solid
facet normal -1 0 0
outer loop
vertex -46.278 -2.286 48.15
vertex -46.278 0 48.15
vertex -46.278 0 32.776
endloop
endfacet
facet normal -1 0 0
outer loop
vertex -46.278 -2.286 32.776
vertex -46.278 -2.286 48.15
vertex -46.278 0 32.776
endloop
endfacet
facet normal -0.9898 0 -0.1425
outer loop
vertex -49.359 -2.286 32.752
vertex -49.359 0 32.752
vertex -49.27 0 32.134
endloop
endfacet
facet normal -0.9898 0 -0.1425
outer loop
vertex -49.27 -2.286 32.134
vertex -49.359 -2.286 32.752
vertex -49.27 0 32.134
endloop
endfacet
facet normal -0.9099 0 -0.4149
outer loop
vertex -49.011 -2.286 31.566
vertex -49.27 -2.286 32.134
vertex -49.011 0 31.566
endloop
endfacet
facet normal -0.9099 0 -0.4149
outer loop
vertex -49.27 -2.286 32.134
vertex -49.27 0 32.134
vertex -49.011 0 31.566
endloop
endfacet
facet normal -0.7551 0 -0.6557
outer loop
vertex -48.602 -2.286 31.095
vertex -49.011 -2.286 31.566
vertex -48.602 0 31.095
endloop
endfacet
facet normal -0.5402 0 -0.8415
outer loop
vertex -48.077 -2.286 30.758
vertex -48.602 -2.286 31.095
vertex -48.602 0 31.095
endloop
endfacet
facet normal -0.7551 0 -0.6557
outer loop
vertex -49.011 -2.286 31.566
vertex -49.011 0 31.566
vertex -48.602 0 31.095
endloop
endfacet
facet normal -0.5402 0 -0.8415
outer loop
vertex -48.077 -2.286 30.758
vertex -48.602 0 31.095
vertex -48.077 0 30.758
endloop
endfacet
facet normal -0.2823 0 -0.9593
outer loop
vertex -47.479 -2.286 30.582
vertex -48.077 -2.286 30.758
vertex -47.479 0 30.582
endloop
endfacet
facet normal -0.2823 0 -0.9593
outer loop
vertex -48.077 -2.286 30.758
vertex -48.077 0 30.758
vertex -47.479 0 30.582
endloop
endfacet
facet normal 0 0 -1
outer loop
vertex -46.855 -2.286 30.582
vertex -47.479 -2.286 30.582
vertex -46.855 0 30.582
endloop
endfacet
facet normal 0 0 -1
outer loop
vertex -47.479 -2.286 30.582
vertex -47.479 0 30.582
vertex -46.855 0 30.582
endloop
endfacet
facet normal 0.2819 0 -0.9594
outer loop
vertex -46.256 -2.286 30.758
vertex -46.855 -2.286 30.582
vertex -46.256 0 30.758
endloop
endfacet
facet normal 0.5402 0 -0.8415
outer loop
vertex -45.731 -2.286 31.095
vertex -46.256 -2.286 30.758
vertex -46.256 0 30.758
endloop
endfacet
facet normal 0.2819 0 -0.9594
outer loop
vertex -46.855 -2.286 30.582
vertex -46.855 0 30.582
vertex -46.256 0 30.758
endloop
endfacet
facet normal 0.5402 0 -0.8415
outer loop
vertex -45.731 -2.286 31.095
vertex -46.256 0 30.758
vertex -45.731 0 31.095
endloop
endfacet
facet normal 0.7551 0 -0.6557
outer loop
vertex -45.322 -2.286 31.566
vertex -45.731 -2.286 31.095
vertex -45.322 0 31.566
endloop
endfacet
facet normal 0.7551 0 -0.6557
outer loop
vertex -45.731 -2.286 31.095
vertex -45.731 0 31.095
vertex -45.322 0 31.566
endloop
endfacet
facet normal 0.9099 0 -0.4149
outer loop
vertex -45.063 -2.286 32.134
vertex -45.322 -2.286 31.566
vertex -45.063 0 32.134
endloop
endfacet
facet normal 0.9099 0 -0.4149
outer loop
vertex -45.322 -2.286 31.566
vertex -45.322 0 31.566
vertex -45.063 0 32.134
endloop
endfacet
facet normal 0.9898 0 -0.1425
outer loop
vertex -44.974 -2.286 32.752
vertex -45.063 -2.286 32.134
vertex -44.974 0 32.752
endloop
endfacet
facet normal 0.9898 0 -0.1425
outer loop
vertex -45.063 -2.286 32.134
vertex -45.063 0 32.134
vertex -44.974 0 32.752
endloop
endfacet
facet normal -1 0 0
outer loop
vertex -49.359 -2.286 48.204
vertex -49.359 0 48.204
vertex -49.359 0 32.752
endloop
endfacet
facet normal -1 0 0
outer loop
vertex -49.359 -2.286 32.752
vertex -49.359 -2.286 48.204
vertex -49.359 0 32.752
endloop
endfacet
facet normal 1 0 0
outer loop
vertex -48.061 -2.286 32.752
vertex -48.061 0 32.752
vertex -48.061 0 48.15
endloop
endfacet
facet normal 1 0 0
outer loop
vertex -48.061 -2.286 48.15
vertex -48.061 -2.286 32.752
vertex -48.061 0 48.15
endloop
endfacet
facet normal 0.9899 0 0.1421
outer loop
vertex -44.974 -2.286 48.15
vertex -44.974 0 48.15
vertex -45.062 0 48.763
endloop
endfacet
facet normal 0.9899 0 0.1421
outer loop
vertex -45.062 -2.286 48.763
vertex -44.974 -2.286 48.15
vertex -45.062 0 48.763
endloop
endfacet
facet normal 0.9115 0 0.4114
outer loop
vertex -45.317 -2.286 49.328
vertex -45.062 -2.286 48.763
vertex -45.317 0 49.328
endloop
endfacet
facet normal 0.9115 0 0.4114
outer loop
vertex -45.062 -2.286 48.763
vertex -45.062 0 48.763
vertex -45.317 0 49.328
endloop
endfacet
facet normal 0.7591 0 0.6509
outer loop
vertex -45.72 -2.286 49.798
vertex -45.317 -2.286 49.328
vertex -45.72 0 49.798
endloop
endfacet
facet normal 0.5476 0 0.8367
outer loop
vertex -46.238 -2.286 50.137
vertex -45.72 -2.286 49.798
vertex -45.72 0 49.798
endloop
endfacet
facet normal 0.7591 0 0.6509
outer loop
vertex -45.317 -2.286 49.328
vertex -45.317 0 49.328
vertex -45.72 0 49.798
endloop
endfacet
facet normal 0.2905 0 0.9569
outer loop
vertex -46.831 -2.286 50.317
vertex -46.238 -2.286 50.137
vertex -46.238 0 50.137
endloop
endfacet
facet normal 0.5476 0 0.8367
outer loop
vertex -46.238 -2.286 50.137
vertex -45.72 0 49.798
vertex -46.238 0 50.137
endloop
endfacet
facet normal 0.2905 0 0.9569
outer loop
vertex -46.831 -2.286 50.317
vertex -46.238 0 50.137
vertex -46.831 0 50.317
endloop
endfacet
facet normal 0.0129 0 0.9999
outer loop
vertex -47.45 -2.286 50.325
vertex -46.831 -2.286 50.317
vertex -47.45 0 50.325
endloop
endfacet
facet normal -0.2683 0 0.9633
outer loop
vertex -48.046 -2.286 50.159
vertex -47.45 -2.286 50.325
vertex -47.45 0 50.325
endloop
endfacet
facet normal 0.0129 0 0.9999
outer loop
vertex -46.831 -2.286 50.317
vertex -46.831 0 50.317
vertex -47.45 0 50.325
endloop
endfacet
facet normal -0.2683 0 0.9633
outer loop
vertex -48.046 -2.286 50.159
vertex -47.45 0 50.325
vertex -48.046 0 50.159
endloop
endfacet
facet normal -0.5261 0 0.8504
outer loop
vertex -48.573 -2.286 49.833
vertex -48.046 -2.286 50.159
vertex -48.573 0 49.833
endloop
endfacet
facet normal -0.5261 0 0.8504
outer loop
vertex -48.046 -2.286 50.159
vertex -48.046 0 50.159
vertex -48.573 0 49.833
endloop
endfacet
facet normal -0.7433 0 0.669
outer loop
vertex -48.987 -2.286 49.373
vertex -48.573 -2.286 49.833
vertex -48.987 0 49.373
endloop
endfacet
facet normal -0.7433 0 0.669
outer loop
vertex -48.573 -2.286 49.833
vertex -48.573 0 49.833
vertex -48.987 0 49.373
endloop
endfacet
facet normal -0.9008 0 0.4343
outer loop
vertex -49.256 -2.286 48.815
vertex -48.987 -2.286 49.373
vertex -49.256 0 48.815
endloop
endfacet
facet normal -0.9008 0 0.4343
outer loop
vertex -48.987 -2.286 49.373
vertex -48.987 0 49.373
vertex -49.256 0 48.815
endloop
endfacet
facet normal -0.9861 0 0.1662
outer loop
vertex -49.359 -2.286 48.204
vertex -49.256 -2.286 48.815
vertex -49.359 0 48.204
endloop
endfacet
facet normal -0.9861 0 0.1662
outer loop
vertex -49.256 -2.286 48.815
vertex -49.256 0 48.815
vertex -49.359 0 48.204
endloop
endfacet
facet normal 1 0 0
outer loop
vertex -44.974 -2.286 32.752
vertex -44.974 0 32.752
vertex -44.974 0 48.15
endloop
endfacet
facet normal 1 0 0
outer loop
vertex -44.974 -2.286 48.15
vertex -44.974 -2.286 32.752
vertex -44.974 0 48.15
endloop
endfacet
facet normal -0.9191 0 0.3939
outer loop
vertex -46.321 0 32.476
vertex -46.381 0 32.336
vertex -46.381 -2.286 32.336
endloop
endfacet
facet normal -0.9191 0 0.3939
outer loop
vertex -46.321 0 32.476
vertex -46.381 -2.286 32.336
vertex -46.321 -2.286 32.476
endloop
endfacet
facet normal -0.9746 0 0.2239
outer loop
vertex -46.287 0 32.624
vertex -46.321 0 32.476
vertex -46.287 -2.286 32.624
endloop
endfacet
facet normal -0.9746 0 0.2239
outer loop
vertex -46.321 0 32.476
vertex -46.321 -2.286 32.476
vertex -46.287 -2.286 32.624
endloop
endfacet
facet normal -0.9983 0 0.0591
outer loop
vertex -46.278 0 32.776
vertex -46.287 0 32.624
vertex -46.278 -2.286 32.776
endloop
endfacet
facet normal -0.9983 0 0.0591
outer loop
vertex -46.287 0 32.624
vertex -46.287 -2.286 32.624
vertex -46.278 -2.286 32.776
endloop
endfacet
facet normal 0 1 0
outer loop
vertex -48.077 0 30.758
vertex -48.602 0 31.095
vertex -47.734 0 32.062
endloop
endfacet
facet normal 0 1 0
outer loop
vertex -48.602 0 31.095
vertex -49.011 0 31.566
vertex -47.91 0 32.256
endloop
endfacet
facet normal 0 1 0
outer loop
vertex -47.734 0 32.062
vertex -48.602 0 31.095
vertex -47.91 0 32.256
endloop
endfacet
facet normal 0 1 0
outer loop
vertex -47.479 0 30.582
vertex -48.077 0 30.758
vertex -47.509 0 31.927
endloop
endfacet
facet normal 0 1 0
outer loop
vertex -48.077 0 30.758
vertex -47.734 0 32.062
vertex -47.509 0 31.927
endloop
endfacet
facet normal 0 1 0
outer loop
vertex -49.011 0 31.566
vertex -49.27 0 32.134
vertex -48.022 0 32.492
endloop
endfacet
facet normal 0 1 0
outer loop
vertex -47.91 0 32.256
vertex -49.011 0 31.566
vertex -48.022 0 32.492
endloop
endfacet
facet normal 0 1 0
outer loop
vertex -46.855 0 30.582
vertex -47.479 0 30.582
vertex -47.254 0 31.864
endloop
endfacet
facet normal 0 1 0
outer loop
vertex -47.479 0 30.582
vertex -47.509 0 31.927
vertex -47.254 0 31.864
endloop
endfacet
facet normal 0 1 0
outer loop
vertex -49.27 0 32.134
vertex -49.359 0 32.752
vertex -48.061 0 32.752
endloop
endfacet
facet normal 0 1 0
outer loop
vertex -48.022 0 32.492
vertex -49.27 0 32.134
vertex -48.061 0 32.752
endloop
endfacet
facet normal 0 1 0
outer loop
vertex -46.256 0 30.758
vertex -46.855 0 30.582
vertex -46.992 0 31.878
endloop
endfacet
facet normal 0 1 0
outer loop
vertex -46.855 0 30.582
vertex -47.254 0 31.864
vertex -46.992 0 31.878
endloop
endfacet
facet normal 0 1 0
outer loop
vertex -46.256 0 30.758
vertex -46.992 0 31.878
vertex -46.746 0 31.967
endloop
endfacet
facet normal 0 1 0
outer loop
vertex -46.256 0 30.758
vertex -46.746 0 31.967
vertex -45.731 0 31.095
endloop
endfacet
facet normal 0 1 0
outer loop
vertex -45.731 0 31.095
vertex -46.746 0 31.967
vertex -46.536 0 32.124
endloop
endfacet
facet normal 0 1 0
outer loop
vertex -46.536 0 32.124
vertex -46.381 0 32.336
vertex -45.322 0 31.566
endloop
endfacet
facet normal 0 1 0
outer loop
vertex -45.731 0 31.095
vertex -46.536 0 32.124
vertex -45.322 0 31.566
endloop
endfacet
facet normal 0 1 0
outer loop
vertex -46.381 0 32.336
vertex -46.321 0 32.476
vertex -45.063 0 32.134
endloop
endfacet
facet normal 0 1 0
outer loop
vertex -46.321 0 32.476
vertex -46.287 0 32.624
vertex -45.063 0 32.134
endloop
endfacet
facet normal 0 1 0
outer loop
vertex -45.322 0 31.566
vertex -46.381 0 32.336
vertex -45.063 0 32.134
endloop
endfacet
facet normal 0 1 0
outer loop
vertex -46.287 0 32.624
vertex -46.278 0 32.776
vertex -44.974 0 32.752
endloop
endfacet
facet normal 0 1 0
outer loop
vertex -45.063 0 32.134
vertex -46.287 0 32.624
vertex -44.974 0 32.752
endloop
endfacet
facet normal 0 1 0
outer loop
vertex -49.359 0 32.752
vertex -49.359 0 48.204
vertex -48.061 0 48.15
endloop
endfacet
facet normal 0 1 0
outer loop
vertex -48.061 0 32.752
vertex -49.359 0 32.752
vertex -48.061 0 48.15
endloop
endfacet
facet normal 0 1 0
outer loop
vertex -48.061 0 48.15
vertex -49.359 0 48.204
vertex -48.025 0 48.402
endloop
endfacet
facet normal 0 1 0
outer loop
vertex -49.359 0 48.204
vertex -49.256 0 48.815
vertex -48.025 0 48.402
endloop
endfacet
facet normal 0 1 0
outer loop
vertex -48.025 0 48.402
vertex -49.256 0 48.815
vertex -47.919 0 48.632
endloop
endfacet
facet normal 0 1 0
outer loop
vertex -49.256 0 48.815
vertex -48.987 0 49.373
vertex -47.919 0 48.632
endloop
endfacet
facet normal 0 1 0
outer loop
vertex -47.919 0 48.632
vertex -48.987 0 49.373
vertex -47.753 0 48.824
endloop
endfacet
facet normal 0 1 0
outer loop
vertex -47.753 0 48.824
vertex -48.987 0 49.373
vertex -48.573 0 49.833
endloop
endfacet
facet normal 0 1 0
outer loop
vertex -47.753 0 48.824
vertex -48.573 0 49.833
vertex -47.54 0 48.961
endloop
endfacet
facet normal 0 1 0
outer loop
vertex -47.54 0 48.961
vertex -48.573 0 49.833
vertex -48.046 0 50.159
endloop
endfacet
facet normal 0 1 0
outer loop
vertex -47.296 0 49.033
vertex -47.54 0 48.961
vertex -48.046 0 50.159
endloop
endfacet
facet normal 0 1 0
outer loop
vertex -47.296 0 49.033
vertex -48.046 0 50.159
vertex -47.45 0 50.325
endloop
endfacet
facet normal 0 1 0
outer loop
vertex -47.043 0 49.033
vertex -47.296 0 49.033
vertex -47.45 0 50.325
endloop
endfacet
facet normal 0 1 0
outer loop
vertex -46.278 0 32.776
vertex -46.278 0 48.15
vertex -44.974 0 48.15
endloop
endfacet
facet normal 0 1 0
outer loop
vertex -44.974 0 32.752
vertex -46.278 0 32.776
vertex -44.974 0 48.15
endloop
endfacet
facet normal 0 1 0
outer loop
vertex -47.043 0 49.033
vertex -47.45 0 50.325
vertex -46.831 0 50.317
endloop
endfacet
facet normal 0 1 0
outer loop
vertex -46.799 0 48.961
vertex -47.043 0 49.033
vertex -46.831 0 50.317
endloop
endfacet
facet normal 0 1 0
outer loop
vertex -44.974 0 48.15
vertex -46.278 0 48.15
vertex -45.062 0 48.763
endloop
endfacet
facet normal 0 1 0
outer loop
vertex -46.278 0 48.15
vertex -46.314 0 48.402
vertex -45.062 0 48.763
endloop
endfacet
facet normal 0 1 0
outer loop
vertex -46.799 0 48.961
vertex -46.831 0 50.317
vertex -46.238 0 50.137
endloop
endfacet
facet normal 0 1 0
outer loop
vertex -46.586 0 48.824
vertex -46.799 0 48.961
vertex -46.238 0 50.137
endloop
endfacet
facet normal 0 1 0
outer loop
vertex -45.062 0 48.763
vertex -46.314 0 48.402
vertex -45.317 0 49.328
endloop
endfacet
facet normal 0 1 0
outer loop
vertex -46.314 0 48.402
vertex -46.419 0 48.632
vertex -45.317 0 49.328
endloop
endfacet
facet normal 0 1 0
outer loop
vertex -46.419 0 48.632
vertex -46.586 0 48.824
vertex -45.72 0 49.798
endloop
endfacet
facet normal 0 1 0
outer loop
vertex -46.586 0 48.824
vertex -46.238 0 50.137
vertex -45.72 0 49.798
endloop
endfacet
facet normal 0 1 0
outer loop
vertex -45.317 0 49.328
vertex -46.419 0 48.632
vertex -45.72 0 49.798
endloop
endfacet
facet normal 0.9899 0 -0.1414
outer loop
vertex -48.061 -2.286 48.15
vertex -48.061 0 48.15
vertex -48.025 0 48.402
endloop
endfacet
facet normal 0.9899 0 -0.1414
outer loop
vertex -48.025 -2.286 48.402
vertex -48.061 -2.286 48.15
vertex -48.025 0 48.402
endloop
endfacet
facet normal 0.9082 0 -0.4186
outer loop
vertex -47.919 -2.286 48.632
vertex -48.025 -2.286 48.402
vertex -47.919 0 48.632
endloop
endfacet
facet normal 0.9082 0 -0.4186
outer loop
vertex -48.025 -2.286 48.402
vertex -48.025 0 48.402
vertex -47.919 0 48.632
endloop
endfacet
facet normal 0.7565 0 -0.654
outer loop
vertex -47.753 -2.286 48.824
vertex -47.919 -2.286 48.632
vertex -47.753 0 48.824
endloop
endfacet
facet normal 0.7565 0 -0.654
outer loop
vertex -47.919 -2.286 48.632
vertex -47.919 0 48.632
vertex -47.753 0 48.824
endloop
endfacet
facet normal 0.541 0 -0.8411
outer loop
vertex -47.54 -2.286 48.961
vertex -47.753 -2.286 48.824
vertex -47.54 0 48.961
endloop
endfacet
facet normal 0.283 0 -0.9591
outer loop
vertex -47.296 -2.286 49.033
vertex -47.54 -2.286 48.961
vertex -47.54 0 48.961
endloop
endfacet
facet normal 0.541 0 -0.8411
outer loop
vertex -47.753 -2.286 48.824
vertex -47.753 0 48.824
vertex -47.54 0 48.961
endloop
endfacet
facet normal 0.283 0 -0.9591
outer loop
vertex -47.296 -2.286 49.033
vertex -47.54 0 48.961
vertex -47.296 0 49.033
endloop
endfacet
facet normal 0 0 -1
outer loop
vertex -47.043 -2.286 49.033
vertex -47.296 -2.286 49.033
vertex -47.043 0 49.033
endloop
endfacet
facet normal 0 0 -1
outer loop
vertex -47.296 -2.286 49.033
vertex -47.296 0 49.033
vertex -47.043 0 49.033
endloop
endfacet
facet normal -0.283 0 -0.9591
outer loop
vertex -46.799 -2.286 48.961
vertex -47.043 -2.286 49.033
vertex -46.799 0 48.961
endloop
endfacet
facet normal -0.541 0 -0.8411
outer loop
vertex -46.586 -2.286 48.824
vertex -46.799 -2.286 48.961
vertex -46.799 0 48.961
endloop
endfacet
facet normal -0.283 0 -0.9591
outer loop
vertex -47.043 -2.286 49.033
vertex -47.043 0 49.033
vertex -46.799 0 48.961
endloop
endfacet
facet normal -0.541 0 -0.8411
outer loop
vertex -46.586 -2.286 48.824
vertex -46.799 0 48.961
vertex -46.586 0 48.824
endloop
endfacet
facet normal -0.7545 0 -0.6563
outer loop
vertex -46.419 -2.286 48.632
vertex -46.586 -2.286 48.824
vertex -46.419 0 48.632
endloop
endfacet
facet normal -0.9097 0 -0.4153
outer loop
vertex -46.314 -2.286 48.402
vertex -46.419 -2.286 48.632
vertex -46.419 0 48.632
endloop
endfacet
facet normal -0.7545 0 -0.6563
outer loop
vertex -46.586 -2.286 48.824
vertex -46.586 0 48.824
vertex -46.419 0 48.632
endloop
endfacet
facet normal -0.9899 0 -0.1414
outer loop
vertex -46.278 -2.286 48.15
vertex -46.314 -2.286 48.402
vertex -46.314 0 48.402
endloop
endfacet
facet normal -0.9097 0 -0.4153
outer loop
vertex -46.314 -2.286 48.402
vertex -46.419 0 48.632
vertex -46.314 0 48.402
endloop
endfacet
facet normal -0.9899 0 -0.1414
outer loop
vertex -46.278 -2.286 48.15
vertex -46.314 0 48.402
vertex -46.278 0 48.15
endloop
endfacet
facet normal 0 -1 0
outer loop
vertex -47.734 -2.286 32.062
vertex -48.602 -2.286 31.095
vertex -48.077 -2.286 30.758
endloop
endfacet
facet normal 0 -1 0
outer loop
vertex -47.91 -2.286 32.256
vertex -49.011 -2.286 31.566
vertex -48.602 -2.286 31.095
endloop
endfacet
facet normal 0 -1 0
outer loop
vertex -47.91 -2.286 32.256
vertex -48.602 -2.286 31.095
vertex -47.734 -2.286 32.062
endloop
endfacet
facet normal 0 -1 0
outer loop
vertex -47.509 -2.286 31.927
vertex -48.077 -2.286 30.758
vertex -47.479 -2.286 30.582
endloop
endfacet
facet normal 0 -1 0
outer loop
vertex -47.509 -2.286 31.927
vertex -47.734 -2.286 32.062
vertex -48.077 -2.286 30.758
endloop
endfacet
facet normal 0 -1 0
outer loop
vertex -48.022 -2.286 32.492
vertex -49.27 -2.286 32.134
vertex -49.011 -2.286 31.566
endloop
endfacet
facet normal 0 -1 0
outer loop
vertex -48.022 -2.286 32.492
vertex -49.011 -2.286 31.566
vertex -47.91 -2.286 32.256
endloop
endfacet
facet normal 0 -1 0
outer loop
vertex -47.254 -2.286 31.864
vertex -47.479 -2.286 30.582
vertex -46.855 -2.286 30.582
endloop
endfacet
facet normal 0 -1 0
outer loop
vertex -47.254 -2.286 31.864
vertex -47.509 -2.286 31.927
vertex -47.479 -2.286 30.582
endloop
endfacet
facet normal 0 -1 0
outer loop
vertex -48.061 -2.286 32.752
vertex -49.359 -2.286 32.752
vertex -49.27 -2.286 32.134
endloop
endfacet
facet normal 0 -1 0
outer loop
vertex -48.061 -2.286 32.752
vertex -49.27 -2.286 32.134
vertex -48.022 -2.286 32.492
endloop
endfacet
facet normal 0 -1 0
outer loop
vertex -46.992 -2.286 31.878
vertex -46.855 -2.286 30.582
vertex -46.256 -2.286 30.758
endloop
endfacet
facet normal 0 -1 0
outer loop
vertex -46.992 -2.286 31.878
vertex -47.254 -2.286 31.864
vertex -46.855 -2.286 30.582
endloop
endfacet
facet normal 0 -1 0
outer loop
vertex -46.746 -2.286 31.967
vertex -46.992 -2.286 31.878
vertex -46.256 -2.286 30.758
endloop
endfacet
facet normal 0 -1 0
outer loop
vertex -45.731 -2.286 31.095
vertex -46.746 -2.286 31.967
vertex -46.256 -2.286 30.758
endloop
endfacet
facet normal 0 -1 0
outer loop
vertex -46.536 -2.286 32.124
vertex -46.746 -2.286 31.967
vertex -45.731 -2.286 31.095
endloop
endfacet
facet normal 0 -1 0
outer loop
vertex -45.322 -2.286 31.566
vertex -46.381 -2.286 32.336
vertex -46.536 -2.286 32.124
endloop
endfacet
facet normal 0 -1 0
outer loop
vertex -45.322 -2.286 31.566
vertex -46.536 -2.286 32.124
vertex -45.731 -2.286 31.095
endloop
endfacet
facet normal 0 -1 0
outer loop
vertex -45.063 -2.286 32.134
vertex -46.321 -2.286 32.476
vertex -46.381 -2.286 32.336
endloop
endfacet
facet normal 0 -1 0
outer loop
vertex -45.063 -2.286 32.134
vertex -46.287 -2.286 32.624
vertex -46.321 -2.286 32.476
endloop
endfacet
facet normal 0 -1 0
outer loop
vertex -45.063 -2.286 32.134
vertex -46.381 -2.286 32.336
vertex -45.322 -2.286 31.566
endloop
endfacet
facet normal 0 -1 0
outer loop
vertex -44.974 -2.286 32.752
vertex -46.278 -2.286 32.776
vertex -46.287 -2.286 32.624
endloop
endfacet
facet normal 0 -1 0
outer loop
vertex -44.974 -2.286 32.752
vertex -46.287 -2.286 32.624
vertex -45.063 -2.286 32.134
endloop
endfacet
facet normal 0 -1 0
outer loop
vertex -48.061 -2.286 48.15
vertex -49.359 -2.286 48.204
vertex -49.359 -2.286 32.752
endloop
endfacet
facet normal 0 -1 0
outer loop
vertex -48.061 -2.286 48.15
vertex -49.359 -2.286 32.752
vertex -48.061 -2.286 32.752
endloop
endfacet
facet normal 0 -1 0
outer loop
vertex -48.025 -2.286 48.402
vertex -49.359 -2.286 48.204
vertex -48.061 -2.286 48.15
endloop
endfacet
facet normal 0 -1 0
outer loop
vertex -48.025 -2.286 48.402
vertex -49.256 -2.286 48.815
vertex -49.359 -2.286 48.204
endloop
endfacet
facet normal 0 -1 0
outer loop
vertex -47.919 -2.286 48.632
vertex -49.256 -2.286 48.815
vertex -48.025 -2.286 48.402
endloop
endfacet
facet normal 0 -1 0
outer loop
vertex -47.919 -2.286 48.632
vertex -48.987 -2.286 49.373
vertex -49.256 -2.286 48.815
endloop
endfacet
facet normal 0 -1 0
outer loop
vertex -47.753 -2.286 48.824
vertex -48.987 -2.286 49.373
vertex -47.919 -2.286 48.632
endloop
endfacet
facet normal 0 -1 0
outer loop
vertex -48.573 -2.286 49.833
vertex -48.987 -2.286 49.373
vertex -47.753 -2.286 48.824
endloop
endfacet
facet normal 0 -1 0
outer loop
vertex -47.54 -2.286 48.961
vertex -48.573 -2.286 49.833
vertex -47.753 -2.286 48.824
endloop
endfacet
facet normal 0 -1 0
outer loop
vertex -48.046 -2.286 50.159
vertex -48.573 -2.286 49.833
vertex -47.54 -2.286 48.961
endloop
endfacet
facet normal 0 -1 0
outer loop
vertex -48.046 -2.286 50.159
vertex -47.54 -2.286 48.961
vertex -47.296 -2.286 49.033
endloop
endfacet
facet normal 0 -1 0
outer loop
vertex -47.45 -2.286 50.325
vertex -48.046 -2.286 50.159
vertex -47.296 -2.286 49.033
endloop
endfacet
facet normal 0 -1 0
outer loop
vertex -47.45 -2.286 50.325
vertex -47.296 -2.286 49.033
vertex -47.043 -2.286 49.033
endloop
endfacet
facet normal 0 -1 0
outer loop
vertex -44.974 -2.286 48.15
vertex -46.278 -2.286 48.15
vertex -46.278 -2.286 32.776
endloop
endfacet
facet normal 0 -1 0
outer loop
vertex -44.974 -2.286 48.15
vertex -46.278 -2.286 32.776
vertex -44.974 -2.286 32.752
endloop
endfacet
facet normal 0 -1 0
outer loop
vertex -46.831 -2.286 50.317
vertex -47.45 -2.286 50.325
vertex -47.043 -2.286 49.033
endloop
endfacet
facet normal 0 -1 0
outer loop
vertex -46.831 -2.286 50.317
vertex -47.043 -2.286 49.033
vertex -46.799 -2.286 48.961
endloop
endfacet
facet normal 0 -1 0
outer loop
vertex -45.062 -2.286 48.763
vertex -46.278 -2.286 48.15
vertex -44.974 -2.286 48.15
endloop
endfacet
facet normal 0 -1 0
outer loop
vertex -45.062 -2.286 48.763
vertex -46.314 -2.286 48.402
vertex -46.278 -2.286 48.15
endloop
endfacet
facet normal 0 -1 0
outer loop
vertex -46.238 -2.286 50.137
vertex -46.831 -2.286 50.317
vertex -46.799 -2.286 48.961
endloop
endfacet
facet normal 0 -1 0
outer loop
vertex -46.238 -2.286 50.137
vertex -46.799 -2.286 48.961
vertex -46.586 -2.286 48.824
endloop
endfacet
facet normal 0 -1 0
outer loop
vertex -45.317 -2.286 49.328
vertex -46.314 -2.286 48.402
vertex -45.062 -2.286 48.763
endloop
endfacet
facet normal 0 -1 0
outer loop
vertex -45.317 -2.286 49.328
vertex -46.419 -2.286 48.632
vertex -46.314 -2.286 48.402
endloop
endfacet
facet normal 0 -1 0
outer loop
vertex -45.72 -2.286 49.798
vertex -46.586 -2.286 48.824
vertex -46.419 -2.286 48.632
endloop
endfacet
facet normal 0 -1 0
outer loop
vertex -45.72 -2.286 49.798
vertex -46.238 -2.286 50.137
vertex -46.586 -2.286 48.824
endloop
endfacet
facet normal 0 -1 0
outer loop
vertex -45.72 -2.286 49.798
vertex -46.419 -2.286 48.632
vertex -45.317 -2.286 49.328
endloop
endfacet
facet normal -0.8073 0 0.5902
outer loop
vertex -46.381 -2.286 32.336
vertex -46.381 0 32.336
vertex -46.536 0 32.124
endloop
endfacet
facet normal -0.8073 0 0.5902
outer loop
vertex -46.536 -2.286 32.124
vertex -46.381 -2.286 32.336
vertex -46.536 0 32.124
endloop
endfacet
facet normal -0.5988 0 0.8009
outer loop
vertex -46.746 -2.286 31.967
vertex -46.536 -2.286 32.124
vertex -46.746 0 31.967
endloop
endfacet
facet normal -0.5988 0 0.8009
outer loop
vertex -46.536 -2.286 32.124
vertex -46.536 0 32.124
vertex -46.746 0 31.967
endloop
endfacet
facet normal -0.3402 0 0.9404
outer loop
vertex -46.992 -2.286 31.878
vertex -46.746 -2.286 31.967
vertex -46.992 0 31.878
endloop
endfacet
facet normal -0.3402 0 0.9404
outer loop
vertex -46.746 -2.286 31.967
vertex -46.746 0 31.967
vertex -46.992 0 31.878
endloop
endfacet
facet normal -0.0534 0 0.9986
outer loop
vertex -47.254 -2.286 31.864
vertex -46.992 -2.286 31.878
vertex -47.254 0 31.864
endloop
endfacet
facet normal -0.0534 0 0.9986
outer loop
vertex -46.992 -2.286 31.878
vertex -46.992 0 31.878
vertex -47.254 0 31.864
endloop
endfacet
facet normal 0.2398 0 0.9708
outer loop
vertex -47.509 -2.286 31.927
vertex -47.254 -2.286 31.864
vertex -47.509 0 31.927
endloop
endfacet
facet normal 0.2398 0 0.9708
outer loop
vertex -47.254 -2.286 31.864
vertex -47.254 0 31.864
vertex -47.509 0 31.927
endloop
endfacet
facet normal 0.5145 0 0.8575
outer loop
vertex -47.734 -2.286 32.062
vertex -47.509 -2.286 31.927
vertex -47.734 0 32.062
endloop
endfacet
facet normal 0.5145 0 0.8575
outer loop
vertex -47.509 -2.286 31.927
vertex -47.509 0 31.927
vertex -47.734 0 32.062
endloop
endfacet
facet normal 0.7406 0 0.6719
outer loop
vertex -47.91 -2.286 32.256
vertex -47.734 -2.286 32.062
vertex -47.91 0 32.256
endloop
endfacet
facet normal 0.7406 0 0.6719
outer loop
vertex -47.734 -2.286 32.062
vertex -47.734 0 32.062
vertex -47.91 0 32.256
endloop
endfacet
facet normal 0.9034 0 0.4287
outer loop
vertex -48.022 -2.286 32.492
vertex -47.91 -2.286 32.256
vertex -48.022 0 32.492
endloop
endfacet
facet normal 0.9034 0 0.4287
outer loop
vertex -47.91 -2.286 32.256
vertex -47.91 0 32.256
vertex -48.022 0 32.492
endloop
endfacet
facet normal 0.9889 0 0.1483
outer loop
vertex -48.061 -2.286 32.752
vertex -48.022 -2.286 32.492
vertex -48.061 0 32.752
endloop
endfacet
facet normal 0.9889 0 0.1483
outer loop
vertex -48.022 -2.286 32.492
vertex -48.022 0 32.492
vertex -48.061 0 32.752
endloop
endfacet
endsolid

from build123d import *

# Parameters (mm, degrees)
F1_DEPTH = 2.286
F2_D     = 1.778


with BuildPart() as f1:
    # F0 (on Front) → F1 (new body)
    with BuildSketch(Plane.XZ):
        with BuildLine():
            ThreePointArc((-44.9743270874, 48.1504499912), (-47.139991973, 50.3428364156), (-49.3587702513, 48.2042187354))
            Line((-49.3587702513, 48.2042187354), (-49.3587702513, 32.7516756952))
            ThreePointArc((-49.3587702513, 32.7516756952), (-47.1665486693, 30.5594541132), (-44.9743270874, 32.7516756952))
            Line((-44.9743270874, 32.7516756952), (-44.9743270874, 48.1504499912))
        make_face()
        with BuildLine():
            ThreePointArc((-48.060906813, 48.1504499912), (-47.1693925898, 49.0419642144), (-46.2778783666, 48.1504499912))
            Line((-46.2778783666, 48.1504499912), (-46.2778783666, 32.7516756952))
            ThreePointArc((-46.2778783666, 32.7516756952), (-47.1693925898, 31.860161472), (-48.060906813, 32.7516756952))
            Line((-48.060906813, 32.7516756952), (-48.060906813, 48.1504499912))
        make_face(mode=Mode.SUBTRACT)
    extrude(amount=F1_DEPTH)

    # F2 (through all)
    with Locations(Plane(origin=(0, 0, 0), x_dir=(1, 0, 0), z_dir=(0, 1, 0))):
        with Locations((-47.1668783666, -48.1504499912), (-47.1665486693, -32.7516756952)):
            Hole(F2_D / 2)


solid = f1.part
